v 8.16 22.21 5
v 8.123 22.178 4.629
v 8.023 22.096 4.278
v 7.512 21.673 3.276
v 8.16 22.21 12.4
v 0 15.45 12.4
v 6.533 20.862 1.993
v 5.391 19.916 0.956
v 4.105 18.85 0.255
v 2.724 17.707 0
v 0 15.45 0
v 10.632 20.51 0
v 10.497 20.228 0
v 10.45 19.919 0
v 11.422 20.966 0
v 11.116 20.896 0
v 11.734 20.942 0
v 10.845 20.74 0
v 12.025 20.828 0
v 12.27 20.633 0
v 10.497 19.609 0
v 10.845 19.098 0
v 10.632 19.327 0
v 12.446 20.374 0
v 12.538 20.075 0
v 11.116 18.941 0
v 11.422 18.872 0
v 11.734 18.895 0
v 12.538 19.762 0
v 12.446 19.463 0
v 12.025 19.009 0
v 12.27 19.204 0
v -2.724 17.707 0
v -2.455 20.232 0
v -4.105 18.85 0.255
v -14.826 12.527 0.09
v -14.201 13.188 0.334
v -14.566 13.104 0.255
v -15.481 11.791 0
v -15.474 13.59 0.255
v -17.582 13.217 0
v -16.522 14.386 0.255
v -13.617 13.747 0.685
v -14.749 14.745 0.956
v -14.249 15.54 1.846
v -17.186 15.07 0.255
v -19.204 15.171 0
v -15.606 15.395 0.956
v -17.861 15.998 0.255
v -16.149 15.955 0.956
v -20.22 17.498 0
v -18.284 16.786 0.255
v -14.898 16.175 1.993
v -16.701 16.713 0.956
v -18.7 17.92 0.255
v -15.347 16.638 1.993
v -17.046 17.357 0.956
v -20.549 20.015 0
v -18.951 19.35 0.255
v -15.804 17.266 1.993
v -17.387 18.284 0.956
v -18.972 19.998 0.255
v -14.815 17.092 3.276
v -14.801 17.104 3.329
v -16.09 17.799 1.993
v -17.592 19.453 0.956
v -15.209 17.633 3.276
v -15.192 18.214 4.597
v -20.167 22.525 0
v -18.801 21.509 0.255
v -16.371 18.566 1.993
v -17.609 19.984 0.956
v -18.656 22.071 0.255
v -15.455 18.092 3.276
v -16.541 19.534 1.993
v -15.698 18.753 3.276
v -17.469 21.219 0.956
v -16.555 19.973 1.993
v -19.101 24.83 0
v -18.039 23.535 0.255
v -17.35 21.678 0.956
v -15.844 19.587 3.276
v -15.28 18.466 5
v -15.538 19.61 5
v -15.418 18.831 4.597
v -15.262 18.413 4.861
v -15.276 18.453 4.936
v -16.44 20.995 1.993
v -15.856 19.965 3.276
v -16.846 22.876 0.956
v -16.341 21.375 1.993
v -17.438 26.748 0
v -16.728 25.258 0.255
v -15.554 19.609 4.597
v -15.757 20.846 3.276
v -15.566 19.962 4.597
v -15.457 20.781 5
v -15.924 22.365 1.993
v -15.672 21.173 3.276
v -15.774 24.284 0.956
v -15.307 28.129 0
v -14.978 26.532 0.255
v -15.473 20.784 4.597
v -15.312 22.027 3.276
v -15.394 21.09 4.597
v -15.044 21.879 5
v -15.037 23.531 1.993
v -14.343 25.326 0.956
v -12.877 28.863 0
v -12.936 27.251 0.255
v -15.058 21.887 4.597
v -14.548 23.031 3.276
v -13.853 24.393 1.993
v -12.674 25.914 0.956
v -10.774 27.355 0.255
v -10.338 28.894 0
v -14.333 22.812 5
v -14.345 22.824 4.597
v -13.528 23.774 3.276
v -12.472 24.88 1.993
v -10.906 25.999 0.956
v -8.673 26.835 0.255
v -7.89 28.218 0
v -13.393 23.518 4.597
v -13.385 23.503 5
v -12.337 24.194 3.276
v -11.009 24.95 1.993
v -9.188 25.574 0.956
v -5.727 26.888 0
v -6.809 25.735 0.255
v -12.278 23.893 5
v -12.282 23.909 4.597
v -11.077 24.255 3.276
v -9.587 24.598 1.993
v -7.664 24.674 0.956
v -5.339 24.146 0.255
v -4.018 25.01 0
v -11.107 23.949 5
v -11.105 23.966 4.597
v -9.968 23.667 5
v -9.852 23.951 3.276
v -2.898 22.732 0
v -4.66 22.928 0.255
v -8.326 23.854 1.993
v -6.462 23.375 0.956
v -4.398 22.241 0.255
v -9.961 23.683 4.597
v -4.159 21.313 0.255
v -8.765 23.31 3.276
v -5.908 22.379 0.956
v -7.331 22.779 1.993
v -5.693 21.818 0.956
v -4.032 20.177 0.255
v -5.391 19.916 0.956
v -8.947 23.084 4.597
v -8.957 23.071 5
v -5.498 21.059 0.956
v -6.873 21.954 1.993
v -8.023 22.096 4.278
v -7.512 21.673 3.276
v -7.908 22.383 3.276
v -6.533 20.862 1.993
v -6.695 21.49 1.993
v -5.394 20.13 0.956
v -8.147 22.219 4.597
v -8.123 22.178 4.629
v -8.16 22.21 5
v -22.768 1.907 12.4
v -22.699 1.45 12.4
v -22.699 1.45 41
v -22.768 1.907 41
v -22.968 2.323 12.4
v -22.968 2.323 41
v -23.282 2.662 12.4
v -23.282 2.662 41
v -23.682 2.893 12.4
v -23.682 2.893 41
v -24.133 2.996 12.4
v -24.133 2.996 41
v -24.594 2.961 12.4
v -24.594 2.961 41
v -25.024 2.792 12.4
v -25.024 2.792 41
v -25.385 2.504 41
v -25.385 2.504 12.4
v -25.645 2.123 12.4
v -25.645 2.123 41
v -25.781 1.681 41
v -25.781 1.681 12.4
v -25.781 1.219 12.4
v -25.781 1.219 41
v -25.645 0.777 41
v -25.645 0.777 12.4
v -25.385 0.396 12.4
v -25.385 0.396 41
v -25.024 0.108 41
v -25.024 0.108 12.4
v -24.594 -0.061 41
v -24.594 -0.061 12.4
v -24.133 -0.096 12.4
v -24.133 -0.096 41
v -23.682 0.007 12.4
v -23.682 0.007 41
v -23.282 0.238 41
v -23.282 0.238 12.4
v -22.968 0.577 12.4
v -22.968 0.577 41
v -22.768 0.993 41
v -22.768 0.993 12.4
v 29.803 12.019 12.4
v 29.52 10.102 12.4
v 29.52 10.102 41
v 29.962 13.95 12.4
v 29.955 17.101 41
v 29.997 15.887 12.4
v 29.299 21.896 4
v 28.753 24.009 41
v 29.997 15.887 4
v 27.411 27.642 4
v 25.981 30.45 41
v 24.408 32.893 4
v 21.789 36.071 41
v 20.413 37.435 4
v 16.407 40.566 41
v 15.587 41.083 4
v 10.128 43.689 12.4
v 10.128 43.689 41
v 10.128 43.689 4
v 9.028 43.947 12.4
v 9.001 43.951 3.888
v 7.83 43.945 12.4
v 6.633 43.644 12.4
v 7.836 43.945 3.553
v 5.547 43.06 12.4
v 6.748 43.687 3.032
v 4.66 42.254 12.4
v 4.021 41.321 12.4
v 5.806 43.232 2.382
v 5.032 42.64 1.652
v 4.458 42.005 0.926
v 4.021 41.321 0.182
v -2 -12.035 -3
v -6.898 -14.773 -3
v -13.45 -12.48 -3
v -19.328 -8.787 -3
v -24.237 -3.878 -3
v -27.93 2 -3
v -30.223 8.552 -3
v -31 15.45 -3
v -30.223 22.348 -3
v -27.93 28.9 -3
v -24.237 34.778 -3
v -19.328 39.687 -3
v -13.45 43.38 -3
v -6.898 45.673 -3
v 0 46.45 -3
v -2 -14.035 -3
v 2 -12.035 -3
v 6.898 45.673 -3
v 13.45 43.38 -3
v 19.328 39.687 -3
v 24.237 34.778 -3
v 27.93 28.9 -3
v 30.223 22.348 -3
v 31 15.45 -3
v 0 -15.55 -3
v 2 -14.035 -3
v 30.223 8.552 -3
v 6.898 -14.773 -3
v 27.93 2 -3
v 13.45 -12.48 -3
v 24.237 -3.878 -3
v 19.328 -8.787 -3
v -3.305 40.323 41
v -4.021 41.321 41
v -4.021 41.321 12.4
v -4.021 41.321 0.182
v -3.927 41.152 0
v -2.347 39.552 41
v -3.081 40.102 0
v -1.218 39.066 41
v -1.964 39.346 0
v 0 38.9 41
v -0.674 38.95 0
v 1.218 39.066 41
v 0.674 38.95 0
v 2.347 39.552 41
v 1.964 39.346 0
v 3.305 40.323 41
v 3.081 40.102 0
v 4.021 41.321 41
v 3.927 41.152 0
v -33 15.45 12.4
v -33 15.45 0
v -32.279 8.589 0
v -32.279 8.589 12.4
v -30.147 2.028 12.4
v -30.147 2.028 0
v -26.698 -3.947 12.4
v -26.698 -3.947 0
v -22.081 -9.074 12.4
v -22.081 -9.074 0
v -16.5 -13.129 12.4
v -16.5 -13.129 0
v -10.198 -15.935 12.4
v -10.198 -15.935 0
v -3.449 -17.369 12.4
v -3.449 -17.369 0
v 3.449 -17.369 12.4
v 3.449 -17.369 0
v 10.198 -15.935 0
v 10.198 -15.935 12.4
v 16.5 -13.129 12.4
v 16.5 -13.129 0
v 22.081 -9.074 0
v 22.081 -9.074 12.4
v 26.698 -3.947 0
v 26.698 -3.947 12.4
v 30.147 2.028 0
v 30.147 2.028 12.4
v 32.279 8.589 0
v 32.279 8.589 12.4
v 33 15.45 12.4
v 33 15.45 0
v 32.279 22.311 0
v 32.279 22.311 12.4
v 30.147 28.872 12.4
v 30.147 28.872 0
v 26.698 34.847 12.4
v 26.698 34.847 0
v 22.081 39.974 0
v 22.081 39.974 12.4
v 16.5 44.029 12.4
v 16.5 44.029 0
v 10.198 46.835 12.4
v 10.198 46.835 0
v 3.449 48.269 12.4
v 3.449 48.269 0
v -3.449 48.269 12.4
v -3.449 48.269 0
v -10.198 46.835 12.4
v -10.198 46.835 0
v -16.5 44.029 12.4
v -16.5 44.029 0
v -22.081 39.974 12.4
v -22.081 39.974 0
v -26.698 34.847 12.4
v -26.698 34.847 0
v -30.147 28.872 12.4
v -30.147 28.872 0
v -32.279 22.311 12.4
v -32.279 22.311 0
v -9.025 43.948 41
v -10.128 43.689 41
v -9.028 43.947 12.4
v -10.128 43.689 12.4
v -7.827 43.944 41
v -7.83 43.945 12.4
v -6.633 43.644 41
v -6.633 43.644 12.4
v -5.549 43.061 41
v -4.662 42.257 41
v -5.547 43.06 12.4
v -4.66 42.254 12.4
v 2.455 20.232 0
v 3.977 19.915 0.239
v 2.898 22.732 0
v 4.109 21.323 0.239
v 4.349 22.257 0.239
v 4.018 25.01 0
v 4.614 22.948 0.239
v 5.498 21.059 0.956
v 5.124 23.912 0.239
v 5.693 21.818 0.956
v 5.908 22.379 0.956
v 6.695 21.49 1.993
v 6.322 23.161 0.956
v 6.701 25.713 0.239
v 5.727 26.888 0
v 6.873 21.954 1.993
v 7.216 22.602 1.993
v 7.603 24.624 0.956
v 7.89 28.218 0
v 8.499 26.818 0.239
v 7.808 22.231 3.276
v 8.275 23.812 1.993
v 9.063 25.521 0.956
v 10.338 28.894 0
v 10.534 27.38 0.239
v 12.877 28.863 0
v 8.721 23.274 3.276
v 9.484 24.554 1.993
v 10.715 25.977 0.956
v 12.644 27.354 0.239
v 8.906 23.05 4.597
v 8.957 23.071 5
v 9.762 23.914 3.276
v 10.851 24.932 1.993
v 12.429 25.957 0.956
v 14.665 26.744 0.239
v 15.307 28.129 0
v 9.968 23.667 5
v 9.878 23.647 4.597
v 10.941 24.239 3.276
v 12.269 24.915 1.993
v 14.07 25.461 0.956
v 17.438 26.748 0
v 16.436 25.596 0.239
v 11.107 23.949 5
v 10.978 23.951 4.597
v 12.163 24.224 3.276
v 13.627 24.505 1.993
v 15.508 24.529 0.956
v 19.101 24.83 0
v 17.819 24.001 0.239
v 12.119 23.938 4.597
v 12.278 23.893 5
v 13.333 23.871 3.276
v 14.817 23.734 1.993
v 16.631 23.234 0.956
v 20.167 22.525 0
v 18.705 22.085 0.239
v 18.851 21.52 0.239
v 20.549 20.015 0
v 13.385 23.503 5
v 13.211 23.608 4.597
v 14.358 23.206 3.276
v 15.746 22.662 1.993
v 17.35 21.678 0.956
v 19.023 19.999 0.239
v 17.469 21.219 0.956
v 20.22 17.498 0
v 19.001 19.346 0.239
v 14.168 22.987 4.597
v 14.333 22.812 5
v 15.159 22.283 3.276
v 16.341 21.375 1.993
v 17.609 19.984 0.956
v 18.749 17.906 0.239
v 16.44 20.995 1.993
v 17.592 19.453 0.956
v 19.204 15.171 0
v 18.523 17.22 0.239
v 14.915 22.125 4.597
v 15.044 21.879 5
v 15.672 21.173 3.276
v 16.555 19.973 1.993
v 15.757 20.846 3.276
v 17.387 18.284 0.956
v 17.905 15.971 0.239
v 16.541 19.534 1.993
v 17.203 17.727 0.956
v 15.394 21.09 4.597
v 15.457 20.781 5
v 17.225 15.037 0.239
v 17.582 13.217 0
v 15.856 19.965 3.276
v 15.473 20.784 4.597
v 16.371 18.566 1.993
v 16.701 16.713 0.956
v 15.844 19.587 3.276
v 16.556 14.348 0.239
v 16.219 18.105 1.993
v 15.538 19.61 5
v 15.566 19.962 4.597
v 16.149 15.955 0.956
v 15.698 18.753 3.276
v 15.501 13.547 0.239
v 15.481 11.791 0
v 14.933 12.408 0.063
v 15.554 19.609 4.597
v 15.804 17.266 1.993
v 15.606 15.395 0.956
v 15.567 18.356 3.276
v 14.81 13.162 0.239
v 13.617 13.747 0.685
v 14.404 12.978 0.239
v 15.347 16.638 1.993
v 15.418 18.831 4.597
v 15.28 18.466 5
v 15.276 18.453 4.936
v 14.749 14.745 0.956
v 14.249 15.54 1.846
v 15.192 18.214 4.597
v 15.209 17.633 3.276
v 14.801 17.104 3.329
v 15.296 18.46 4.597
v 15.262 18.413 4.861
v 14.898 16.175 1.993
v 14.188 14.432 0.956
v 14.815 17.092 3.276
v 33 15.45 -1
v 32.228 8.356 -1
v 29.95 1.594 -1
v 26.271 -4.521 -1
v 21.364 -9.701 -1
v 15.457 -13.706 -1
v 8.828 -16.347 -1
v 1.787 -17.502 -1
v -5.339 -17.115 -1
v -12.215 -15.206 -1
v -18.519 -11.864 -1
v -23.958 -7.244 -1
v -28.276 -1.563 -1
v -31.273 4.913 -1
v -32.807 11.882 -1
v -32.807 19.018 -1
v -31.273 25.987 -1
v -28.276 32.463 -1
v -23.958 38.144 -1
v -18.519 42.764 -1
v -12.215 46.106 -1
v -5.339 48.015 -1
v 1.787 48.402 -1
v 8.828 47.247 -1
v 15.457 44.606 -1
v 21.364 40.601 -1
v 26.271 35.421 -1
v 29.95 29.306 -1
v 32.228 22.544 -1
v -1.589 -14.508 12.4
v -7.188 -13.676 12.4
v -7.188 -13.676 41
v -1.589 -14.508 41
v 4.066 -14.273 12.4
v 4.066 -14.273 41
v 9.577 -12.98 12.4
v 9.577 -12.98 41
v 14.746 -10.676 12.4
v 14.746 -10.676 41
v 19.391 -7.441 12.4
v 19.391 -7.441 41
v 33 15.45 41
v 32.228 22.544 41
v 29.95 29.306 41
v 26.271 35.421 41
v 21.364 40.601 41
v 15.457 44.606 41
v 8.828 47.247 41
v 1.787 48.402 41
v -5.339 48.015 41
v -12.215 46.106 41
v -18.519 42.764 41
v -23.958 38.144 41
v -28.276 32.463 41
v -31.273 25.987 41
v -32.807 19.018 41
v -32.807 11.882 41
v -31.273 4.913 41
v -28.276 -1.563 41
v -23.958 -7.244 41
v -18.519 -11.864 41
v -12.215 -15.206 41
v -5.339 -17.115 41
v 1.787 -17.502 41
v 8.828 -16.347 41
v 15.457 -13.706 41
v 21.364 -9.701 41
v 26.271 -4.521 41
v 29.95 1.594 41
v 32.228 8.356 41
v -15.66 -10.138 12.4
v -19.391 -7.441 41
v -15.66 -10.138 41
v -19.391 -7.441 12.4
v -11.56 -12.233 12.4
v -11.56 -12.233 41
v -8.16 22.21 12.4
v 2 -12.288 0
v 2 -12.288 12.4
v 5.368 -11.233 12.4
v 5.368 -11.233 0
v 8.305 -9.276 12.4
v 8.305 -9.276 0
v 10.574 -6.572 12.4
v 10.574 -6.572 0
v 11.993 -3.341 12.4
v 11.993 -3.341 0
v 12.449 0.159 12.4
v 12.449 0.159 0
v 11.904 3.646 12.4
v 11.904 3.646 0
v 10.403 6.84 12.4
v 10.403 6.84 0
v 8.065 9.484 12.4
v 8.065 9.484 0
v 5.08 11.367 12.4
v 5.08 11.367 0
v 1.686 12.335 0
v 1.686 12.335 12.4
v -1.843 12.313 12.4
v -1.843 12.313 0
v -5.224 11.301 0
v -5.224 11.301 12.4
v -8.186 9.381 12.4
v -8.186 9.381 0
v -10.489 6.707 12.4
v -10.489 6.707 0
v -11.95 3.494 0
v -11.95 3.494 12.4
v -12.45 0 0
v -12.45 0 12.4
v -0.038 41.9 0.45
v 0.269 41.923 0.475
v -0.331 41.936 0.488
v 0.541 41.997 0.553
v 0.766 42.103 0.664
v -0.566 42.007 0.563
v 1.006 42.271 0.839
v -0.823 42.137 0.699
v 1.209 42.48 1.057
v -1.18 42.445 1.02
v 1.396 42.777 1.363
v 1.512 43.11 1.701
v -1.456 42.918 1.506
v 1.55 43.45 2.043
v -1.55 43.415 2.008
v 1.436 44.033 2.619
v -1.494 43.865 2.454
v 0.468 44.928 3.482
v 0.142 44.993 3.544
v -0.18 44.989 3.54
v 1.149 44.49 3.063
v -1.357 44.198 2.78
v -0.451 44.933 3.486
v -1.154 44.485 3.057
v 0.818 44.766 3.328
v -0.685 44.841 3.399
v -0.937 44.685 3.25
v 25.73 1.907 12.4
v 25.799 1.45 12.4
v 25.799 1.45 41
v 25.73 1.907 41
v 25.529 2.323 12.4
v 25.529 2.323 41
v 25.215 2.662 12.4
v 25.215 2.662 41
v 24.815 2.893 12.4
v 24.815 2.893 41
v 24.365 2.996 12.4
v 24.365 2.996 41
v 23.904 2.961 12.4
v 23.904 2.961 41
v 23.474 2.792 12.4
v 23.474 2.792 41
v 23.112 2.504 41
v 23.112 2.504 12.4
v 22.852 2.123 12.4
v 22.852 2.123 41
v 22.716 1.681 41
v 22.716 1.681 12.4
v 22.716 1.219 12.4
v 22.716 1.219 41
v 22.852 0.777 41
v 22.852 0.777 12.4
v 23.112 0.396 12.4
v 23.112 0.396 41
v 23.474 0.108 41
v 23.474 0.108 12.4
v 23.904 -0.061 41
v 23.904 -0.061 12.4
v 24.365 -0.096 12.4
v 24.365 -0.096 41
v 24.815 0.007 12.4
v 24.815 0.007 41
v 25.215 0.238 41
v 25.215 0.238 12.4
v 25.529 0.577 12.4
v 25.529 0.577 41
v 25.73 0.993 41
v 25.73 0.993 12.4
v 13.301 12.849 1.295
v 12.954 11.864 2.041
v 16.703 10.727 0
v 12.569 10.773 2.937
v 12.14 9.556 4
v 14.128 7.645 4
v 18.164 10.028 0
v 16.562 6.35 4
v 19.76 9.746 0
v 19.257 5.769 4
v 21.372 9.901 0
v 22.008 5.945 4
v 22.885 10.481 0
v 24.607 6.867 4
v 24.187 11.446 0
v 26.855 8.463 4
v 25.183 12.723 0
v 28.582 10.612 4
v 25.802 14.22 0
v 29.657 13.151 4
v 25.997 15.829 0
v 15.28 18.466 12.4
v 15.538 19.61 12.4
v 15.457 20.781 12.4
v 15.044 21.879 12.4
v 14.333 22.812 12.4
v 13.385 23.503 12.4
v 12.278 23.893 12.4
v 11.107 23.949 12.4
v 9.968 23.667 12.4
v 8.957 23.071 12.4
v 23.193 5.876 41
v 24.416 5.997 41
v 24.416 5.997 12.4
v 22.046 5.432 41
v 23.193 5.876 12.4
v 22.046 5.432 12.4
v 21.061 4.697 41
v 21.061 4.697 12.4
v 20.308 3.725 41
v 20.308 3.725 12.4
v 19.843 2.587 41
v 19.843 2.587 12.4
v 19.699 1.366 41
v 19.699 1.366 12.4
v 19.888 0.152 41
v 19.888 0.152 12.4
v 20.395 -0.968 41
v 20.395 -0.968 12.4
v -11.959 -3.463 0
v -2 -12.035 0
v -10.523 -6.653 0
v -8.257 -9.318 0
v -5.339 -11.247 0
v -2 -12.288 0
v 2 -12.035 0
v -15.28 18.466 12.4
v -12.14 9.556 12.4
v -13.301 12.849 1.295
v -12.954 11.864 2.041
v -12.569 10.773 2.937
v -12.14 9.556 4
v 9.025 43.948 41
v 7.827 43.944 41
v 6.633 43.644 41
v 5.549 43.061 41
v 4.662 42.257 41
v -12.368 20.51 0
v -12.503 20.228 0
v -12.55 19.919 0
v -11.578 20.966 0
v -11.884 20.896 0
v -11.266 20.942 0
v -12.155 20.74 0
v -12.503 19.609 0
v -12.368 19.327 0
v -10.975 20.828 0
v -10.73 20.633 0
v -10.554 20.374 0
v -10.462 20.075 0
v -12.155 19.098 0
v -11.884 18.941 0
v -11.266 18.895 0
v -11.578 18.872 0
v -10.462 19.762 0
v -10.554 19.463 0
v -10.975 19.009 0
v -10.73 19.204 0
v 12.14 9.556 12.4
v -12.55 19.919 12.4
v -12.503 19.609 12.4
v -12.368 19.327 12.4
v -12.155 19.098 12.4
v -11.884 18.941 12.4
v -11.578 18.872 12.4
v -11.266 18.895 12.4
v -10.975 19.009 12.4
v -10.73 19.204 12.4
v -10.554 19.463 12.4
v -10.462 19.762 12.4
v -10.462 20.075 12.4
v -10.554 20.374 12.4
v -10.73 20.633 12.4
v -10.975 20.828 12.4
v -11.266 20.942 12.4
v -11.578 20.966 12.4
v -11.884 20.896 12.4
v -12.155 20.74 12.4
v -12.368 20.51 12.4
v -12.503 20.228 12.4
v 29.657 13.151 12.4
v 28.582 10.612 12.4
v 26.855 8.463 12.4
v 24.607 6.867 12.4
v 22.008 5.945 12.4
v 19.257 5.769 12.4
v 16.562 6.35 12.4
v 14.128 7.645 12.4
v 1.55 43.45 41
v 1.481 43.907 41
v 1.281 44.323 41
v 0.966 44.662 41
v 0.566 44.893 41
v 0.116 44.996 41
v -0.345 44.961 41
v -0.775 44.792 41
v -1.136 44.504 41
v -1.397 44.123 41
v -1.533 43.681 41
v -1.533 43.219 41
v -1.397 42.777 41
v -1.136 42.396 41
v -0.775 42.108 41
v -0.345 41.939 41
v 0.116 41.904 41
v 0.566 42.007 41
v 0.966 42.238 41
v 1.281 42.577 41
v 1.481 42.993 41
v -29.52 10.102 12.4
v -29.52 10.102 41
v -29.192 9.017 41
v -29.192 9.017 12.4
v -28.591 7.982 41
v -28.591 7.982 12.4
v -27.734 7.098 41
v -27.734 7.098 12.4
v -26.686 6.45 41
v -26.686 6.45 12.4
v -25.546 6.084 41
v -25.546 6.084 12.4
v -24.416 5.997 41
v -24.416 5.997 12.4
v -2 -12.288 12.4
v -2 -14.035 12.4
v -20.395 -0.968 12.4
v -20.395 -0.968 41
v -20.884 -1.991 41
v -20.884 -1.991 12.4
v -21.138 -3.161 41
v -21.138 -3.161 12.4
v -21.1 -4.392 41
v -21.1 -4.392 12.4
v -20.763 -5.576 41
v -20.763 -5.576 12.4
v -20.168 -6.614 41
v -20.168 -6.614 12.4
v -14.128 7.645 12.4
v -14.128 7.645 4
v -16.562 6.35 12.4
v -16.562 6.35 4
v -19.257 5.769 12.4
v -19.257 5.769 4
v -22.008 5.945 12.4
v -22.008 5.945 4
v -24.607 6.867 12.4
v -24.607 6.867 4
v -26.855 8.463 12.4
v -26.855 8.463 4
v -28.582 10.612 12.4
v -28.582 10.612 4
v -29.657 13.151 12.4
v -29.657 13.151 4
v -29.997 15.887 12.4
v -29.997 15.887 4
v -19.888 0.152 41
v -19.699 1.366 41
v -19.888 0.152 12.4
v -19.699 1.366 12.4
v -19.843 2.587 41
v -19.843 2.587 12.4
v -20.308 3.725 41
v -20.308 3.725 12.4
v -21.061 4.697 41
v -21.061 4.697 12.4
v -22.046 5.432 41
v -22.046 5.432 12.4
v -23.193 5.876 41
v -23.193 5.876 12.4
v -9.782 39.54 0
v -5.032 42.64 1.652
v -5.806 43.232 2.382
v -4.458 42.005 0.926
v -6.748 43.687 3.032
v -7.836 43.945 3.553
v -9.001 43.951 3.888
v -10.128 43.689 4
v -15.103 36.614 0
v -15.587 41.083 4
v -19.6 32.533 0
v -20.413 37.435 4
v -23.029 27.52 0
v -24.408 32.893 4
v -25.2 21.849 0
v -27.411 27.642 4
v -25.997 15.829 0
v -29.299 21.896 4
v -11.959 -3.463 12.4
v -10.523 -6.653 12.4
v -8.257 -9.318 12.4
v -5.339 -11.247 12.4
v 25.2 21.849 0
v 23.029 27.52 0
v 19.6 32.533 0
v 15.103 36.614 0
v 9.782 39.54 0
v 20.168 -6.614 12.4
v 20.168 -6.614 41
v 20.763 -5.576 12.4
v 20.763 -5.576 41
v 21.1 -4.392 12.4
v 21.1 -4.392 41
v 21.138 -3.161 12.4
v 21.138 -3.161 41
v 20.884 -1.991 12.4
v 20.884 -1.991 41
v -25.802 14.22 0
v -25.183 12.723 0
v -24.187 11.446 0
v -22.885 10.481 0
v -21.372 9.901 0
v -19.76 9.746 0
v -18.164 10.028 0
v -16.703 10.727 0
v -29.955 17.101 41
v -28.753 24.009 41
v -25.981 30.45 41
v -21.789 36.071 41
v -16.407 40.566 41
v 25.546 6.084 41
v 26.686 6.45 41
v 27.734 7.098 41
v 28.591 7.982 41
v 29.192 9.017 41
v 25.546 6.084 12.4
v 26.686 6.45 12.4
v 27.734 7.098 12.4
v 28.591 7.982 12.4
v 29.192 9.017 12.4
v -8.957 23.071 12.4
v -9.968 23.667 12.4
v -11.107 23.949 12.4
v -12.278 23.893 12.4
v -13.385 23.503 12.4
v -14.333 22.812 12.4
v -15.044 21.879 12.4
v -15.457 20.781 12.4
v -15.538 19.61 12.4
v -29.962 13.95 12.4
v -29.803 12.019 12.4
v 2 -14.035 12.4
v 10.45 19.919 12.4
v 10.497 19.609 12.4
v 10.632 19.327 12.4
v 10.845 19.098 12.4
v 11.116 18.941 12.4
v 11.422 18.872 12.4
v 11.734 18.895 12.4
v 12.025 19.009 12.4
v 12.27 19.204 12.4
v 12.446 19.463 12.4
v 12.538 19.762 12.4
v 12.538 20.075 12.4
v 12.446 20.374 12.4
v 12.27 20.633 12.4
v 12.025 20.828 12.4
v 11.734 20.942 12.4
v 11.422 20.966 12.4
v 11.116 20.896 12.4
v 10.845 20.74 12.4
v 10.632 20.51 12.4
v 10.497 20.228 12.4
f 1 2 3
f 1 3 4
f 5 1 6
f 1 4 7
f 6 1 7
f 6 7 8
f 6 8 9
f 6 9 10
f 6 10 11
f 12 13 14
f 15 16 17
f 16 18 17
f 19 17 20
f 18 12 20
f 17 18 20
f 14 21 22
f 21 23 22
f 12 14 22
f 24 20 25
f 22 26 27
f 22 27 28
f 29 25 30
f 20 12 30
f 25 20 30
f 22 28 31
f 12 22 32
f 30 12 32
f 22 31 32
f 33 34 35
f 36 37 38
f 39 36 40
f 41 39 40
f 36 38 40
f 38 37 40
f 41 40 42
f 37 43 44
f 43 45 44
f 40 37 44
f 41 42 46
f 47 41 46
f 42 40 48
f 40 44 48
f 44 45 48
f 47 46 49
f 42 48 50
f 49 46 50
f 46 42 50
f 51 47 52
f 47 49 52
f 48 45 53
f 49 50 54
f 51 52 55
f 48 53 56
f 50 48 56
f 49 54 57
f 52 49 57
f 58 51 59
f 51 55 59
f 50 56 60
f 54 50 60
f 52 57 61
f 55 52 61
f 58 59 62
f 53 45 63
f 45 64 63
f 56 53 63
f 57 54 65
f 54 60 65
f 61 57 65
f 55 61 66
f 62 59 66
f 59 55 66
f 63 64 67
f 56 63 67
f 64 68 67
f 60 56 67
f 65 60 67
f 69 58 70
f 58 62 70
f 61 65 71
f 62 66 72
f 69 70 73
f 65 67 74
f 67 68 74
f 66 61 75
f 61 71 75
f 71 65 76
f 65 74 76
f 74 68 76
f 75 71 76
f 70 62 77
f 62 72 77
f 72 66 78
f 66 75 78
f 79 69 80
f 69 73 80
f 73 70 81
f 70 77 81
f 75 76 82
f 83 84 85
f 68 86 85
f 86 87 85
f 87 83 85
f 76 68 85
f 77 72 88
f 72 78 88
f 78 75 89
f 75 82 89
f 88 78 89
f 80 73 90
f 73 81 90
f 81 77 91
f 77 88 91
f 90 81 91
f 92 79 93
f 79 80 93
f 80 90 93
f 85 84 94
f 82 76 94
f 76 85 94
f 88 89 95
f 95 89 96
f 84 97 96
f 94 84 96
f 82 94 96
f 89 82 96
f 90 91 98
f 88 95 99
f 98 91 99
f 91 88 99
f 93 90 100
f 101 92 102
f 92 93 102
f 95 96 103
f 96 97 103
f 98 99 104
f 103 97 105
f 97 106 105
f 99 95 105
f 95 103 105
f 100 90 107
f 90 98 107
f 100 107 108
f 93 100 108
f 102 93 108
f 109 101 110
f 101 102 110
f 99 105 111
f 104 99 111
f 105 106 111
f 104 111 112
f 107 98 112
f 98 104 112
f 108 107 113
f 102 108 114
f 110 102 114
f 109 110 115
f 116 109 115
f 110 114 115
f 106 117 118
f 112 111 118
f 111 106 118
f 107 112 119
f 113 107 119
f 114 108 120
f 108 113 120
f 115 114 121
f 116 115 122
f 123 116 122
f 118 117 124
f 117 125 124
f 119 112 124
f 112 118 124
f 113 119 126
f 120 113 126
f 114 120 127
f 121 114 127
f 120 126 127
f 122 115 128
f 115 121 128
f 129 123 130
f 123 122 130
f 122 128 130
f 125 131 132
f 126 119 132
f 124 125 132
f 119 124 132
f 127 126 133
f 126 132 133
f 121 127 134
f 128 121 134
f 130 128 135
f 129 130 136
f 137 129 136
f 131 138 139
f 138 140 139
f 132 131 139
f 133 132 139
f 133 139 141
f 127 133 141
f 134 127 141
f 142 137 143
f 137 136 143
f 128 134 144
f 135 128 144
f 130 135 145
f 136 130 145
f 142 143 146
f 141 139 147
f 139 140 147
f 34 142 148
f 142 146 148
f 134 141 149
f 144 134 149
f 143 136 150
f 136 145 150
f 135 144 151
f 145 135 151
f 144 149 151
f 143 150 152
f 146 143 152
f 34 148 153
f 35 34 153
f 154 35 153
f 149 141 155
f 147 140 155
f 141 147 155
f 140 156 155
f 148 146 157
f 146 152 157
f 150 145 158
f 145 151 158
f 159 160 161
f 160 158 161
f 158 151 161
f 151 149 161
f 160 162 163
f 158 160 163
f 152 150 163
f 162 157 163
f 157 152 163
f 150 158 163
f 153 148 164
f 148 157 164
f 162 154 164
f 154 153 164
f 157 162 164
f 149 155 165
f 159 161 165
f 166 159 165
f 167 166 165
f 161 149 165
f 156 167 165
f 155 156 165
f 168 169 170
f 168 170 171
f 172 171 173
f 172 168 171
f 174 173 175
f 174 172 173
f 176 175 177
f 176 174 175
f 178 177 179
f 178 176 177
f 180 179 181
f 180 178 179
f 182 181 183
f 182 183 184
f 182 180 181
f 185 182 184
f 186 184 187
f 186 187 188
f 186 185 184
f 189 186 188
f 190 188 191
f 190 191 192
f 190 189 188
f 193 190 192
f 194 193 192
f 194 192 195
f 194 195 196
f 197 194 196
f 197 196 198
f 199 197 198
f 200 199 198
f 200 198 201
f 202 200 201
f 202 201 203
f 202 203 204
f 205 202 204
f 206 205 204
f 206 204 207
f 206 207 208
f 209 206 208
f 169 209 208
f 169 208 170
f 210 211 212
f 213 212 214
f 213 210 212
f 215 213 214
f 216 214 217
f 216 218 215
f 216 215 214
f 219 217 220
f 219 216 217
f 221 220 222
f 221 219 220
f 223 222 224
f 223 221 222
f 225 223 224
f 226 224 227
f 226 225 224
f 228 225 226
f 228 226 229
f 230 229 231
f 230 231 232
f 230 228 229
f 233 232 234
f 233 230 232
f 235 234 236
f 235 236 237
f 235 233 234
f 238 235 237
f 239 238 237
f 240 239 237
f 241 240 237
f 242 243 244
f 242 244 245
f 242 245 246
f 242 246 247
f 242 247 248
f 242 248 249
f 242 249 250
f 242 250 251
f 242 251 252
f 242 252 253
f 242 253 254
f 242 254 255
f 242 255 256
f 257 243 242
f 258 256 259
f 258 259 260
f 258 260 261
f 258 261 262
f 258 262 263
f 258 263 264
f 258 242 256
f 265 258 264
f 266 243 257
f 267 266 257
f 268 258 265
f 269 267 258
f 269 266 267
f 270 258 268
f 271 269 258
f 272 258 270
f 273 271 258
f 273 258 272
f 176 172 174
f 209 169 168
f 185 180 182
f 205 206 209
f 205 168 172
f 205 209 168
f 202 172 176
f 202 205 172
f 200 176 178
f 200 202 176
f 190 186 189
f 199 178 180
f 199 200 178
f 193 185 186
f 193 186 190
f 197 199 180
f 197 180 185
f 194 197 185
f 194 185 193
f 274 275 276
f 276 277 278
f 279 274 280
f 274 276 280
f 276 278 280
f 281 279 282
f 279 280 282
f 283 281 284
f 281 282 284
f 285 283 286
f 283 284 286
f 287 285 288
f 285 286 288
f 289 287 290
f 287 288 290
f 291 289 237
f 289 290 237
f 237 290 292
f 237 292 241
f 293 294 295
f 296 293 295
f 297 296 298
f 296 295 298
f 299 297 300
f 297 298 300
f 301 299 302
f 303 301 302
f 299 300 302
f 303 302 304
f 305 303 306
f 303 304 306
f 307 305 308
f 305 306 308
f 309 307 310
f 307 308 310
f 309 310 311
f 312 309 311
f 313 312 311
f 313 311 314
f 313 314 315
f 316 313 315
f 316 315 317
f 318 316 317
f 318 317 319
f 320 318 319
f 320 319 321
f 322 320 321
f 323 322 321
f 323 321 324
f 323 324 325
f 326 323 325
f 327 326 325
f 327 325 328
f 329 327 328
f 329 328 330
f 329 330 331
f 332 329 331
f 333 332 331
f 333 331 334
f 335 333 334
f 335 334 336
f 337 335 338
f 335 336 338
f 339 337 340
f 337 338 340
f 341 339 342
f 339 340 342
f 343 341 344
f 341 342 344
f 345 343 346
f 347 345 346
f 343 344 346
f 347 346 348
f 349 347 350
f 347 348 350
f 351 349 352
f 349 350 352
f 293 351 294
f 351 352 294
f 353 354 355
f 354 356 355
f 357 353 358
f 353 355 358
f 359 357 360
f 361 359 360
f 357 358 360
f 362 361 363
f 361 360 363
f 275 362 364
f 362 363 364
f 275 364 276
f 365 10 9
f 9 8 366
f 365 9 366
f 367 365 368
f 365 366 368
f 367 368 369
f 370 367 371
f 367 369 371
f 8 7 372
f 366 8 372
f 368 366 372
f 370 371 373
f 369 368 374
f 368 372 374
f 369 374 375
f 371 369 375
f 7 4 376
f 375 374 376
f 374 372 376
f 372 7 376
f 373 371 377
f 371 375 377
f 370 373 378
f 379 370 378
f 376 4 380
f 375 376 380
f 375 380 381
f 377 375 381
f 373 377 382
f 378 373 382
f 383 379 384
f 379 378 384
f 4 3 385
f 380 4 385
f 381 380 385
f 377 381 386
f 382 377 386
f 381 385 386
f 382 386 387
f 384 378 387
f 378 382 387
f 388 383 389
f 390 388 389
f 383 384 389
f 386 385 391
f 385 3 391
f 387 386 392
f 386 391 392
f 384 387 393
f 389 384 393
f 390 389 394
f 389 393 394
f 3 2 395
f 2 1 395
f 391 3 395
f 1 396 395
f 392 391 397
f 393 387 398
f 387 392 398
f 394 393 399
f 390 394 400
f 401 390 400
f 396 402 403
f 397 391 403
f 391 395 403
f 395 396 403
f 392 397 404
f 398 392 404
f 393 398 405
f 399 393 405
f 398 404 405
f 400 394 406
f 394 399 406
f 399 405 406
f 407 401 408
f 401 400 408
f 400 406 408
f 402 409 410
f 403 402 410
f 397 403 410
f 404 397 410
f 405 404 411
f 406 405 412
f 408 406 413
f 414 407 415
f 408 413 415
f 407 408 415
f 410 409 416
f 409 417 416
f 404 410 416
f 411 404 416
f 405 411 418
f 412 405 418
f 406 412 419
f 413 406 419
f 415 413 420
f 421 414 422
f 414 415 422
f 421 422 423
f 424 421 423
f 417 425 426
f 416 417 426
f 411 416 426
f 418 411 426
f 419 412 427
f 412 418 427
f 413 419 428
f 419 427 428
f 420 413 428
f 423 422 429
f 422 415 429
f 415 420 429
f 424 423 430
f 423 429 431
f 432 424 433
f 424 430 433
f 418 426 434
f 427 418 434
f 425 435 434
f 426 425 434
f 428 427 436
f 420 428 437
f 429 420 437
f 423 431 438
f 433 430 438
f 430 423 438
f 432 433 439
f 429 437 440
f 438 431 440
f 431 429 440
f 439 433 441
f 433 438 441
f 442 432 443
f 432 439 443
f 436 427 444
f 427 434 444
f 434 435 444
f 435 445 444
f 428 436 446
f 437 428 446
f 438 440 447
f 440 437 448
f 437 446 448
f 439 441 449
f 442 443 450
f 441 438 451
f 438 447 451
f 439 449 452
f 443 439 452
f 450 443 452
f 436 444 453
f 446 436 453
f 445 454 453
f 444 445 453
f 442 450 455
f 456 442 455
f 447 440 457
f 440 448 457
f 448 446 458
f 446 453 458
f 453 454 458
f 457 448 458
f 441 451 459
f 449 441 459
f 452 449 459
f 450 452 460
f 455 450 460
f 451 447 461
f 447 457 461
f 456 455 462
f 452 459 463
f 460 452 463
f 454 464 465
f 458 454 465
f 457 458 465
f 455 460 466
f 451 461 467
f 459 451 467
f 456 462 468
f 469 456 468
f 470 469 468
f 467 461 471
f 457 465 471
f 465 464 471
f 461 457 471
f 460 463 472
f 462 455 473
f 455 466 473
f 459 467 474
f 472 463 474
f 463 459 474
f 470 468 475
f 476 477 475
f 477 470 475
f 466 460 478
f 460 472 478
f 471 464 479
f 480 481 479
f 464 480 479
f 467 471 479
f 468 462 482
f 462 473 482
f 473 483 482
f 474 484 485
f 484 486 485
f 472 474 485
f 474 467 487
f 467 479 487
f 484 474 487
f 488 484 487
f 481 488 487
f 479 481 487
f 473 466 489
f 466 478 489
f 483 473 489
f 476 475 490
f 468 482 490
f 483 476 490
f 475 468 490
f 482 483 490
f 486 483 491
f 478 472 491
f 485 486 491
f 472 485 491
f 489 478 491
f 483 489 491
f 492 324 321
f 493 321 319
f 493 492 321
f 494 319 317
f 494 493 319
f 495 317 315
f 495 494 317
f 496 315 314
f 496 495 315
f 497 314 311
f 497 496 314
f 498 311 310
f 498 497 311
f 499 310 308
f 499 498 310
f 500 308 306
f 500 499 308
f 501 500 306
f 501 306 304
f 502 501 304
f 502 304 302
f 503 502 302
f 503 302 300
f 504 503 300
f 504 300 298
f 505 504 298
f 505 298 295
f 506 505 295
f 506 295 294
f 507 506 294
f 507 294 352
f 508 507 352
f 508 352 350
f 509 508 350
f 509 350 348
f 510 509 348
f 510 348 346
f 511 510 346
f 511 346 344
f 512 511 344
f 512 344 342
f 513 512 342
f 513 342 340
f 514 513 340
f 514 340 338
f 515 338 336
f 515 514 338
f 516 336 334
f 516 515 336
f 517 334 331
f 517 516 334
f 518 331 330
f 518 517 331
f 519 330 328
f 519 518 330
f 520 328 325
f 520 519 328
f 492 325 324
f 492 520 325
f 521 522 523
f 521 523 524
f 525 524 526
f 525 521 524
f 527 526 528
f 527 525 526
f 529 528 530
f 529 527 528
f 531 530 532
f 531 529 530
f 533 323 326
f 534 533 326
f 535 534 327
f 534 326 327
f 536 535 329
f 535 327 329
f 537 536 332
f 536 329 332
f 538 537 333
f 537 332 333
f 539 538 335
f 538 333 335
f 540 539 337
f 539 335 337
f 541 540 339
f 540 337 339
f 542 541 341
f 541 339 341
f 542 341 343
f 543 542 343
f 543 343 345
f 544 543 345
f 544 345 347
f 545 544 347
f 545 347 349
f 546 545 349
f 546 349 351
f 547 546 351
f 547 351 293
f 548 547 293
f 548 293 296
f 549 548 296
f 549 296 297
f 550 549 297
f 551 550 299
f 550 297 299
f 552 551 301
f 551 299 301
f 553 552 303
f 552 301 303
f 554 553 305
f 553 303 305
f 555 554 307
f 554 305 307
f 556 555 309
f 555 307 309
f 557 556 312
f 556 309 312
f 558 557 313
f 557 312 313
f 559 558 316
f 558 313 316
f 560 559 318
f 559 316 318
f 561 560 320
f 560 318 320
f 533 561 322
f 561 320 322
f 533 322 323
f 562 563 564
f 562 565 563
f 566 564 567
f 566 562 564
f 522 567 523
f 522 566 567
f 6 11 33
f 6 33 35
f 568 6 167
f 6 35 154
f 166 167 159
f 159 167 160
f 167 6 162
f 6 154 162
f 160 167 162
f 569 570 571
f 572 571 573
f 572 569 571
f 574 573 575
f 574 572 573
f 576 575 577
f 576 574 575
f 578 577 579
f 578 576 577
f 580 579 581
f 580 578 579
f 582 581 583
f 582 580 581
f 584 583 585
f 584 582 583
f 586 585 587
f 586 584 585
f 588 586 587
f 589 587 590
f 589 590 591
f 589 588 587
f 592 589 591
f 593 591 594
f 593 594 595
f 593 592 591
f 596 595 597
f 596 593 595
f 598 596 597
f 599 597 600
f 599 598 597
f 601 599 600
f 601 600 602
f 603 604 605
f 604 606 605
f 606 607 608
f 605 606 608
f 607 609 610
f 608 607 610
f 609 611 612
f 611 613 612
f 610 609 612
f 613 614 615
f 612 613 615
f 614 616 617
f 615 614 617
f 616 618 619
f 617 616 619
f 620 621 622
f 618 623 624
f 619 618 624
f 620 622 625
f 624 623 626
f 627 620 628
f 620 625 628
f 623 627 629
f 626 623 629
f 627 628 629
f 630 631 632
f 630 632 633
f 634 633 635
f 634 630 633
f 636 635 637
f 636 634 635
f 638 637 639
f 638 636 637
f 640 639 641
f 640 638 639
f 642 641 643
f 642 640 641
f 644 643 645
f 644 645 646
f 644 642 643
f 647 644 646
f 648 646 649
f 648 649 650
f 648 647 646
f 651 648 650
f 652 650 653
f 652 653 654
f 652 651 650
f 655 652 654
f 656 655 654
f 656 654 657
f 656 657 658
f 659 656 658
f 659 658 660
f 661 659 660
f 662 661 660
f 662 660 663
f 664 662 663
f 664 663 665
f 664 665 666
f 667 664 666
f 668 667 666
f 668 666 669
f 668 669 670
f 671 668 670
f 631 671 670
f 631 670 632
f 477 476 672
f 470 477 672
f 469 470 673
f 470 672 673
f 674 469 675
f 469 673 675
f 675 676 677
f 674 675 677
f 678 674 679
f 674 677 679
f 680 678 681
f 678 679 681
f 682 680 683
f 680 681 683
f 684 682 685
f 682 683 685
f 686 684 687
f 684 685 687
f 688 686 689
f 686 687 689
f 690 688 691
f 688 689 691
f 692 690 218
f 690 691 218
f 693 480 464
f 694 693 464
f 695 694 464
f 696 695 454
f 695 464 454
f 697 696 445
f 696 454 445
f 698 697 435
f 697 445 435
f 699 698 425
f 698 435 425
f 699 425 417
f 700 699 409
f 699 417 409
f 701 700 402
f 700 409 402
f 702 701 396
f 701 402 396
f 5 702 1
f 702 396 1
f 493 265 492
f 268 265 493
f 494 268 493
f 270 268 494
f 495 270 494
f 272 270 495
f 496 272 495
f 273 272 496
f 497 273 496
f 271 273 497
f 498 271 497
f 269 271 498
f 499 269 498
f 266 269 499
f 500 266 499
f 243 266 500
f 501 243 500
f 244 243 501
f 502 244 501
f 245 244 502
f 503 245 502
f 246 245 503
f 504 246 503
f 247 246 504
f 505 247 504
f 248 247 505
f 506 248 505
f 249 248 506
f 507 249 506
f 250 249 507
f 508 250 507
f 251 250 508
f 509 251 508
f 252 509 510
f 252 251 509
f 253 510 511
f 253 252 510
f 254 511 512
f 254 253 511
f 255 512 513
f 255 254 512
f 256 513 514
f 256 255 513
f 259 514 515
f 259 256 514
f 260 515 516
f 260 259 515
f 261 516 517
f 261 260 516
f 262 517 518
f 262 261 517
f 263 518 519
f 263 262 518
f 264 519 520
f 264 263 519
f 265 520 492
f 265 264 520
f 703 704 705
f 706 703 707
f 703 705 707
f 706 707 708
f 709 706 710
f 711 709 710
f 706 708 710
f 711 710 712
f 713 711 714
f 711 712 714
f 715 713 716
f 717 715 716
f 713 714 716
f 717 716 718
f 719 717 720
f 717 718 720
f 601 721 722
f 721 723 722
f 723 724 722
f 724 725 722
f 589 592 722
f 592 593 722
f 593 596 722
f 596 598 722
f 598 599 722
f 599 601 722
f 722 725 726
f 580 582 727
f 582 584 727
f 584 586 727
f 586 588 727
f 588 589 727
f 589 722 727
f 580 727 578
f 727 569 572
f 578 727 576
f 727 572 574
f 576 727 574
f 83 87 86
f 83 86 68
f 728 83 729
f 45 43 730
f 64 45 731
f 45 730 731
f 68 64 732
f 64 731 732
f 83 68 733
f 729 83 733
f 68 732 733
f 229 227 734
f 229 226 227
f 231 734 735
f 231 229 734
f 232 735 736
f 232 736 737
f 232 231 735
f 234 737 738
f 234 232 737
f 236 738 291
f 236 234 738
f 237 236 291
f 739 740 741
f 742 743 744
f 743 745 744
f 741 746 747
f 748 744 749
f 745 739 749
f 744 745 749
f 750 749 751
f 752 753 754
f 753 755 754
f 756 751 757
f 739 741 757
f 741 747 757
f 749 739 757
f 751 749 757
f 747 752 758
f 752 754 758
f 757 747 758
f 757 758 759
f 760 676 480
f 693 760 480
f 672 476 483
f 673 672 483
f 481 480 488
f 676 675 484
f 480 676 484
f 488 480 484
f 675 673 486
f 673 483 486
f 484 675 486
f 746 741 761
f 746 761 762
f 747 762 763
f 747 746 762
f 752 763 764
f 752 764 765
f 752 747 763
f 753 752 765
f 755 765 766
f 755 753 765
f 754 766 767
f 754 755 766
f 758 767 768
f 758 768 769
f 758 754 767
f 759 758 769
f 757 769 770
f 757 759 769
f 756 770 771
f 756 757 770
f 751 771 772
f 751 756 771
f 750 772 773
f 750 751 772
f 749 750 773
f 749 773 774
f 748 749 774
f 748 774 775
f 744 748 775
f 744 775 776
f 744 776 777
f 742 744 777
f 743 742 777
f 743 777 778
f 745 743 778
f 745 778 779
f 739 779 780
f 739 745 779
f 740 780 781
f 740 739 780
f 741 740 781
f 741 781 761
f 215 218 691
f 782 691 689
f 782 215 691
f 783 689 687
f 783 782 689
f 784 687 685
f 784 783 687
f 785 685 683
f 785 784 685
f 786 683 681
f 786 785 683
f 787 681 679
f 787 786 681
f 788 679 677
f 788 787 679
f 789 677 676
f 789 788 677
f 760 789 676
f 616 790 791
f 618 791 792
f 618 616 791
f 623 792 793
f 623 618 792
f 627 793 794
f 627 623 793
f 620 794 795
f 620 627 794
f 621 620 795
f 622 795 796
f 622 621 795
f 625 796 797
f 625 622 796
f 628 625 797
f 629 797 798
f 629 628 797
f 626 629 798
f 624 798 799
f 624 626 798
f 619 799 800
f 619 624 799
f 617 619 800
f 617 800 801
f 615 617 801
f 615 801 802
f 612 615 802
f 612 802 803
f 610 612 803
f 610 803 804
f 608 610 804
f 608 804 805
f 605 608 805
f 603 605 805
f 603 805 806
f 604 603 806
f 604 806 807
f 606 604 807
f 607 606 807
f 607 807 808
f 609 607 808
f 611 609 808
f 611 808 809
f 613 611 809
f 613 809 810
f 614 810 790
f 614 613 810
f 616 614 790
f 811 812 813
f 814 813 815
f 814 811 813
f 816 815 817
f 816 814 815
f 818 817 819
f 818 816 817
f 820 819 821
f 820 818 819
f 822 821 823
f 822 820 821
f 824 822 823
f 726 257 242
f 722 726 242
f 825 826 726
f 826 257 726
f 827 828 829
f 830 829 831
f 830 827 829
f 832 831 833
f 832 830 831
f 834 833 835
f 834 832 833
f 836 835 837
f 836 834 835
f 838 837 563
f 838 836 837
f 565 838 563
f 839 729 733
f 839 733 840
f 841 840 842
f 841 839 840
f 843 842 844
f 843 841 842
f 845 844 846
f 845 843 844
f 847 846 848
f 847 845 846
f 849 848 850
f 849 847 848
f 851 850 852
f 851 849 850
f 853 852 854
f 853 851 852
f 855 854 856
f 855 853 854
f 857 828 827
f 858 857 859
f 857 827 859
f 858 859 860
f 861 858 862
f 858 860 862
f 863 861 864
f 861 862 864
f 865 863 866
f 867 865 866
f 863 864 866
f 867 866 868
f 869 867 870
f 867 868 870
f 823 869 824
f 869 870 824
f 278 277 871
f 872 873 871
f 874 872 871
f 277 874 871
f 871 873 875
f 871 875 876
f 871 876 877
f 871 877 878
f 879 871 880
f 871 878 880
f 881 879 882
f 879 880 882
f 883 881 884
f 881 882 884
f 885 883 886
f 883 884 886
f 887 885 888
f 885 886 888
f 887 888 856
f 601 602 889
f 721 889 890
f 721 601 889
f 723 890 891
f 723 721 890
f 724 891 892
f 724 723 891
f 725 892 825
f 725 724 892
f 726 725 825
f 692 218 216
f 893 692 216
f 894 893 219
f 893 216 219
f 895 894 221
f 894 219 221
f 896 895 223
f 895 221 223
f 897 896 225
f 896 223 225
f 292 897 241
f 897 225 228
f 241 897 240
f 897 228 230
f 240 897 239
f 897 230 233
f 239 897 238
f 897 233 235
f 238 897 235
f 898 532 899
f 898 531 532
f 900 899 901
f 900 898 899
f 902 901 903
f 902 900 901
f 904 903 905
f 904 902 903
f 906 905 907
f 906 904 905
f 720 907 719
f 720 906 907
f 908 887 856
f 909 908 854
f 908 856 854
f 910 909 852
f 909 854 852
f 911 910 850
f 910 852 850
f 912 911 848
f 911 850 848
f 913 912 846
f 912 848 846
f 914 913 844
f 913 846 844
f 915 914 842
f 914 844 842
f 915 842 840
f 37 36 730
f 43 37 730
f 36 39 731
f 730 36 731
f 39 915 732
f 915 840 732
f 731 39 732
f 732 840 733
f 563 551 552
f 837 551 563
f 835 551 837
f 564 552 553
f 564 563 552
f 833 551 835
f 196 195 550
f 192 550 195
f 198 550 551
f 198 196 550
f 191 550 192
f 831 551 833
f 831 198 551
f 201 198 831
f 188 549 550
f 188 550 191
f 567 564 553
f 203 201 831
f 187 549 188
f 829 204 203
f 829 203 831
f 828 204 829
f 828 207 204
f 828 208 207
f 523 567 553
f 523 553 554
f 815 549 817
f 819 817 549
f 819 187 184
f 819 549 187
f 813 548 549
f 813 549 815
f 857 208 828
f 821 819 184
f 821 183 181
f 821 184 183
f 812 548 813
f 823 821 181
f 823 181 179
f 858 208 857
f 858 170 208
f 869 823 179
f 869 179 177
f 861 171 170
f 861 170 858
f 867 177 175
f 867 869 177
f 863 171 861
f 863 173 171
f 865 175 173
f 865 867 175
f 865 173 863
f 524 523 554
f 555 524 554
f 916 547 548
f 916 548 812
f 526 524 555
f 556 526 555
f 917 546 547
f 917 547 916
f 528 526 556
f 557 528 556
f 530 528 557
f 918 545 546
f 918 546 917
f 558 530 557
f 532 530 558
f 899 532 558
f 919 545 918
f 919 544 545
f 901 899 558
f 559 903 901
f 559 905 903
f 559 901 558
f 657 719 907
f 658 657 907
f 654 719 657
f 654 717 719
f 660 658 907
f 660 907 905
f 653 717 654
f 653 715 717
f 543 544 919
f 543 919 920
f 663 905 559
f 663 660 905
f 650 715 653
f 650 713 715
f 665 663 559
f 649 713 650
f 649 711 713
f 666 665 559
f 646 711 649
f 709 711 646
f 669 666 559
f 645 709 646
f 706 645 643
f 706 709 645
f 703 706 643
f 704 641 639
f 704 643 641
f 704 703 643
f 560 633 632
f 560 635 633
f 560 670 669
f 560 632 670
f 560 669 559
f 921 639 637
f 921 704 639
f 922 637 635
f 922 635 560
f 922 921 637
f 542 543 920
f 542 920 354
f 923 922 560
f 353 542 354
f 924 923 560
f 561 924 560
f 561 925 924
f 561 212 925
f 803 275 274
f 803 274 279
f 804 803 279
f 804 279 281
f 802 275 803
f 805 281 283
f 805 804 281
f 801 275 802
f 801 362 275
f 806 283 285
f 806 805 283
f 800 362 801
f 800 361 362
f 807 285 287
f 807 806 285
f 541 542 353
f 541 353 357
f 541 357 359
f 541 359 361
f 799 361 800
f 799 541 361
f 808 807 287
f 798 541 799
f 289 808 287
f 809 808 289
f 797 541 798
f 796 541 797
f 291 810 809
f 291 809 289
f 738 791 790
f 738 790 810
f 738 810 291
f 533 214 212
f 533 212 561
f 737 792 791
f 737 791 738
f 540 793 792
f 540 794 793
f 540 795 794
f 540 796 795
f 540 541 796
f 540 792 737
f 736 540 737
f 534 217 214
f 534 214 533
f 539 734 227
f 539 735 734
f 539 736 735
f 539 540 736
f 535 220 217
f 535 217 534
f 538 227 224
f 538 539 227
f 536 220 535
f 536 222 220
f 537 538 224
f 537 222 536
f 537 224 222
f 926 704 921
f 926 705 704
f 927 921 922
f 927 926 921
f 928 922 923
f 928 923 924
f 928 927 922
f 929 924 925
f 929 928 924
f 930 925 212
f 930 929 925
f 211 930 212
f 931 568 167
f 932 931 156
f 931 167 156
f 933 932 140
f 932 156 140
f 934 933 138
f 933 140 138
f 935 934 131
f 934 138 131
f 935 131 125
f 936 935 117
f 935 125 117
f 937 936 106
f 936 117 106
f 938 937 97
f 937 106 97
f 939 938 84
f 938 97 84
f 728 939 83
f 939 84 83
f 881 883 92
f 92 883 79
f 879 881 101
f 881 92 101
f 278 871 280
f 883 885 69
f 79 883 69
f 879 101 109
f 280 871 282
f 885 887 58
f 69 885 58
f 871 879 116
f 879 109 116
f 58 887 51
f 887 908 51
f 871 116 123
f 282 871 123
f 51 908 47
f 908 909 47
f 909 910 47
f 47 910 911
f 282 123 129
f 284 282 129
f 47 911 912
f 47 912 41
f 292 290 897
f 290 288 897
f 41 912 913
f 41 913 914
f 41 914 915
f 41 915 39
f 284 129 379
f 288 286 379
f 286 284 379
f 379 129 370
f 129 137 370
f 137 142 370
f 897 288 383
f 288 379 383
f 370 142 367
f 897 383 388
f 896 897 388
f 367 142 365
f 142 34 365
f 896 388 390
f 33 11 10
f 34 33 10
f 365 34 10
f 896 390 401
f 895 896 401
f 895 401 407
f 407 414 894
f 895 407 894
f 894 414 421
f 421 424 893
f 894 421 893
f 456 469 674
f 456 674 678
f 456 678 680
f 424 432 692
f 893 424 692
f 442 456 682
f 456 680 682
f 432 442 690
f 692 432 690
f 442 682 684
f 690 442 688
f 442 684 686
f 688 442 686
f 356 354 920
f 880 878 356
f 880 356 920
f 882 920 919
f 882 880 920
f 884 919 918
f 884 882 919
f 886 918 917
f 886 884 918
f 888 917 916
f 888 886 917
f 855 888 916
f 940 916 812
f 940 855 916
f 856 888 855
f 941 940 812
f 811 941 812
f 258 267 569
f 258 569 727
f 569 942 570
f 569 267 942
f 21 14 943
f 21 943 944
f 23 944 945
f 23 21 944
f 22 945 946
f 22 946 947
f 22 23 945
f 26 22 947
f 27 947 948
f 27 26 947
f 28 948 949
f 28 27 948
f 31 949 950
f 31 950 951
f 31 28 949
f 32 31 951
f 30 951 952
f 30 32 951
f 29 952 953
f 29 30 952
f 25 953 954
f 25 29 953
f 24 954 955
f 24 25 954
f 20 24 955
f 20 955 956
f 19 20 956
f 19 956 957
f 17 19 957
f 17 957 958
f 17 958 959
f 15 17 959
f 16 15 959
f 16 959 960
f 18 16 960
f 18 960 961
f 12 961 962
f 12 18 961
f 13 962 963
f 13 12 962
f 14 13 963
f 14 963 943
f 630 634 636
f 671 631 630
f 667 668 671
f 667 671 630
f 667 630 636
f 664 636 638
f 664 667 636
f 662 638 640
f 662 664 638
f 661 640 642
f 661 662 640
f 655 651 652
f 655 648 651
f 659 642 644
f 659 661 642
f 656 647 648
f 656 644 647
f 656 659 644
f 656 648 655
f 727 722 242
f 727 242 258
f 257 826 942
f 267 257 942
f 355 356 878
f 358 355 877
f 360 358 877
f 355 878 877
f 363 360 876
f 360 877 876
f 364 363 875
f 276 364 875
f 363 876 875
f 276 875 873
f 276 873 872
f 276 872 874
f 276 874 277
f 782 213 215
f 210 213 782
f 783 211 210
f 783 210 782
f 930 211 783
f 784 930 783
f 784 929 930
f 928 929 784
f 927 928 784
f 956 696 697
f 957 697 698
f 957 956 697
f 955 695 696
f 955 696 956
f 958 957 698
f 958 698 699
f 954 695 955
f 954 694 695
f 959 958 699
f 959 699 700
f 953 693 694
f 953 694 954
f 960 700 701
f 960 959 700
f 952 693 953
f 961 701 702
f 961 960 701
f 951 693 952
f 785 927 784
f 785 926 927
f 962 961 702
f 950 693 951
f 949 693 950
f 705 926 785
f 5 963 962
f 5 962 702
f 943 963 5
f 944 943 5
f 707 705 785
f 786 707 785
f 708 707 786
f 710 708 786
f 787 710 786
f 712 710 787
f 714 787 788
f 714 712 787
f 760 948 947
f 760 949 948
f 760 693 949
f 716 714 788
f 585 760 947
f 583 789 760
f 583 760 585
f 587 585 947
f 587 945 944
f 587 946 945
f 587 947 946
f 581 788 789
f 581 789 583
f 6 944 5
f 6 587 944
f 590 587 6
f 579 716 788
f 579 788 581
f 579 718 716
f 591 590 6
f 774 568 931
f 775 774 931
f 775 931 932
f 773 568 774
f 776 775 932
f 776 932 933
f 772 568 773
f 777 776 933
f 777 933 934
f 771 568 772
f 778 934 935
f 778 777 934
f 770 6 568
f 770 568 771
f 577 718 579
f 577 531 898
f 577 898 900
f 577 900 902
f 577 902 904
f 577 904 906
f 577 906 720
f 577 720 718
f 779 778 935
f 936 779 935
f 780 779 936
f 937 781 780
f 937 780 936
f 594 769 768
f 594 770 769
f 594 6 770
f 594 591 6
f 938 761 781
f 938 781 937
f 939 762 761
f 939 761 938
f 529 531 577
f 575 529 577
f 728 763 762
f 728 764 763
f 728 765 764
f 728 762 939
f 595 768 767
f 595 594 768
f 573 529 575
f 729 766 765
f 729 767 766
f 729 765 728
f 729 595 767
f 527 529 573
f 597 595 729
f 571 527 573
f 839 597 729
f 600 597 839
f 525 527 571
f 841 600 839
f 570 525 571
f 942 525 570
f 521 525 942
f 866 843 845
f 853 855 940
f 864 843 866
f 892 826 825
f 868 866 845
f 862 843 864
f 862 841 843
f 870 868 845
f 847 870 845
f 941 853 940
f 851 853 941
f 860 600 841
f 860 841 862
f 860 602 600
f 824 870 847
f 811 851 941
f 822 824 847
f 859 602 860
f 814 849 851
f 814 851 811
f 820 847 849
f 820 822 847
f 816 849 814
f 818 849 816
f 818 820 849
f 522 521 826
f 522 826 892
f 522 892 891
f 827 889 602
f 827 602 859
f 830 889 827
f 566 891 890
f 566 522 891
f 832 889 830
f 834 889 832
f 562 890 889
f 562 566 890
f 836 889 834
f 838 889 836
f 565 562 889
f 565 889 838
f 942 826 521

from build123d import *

# Parameters (mm, degrees)
SKETCH1_R                = 15.45
SKETCH1_R_2              = 12.45
SKETCH1_R_3              = 33
SKETCH1_R_4              = 30
SKETCH1_R_5              = 4.05
SKETCH1_R_6              = 1.05
BOSS_EXTRUDE2_DEPTH      = 12.4
BOSS_EXTRUDE3_START      = 3
SKETCH2_R                = 33
BOSS_EXTRUDE3_DEPTH      = 3
SKETCH3_R                = 33
SKETCH3_R_2              = 30
BOSS_EXTRUDE4_DEPTH      = 28.6
FILLET1_R                = 10
BOSS_EXTRUDE5_DEPTH      = 12.4
CHAMFER1_SIZE            = 4
FILLET2_R                = 5
BOSS_EXTRUDE6_DEPTH      = 28.6
BOSS_EXTRUDE6_DEPTH_BACK = 14.4
SKETCH5_R                = 4.55
SKETCH5_R_2              = 1.55
FILLET3_R                = 5
CHAMFER2_SIZE            = 2
SKETCH6_W                = 4
SKETCH6_H                = 2
CUT_EXTRUDE1_DEPTH       = 23.4


with BuildPart() as part:
    # Sketch1 → Boss-Extrude2 (new body)
    # profile 1 of 4: a face of its own
    with BuildSketch(Plane.XY):
        Circle(SKETCH1_R)
        with Locations(Location((0, 0, 0), (0, 0, 180))):
            Circle(SKETCH1_R_2, mode=Mode.SUBTRACT)
    # profile 2 of 4: a face of its own
    with BuildSketch(Plane.XY):
        with Locations(Location((0, 15.45, 0), (0, 0, 180))):
            Circle(SKETCH1_R_3)
        with Locations((0, 15.45)):
            Circle(SKETCH1_R_4, mode=Mode.SUBTRACT)
    # profile 3 of 4: a face of its own
    with BuildSketch(Plane.XY):
        with Locations(Location((11.5, 19.918584287, 0), (0, 0, 180))):
            Circle(SKETCH1_R_5)
        with Locations(Location((11.5, 19.918584287, 0), (0, 0, 180))):
            Circle(SKETCH1_R_6, mode=Mode.SUBTRACT)
    # profile 4 of 4: a face of its own
    with BuildSketch(Plane.XY):
        with Locations(Location((-11.5, 19.918584287, 0), (0, 0, 180))):
            Circle(SKETCH1_R_5)
        with Locations(Location((-11.5, 19.918584287, 0), (0, 0, 180))):
            Circle(SKETCH1_R_6, mode=Mode.SUBTRACT)
    extrude(amount=BOSS_EXTRUDE2_DEPTH)

    # Sketch2 → Boss-Extrude3 (add)
    with BuildSketch(Plane(origin=(0, 0, 0), x_dir=(-1, 0, 0), z_dir=(0, 0, -1)).offset(BOSS_EXTRUDE3_START)):
        with Locations(Location((0, 15.45, 0), (0, 0, 180))):
            Circle(SKETCH2_R)
    extrude(amount=-BOSS_EXTRUDE3_DEPTH)

    # Sketch3 → Boss-Extrude4 (add)
    with BuildSketch(Plane.XY.offset(12.4)):
        with Locations((0, 15.45)):
            Circle(SKETCH3_R)
        with Locations(Location((0, 15.45, 0), (0, 0, 256.137567884))):
            Circle(SKETCH3_R_2, mode=Mode.SUBTRACT)
    extrude(amount=BOSS_EXTRUDE4_DEPTH)

    # Fillet1
    # the kernel refuses this fillet: 10 mm, written as the material it adds along each edge
    with BuildSketch(Plane(origin=(-7.18774525, -13.676213592, 12.4), x_dir=(-0.20848530714015037, 0.9780254990063793, 0), z_dir=(0, 0, -1))) as fillet1_piece_1:
        with BuildLine():
            CenterArc((31.441766058, -6.395526036), FILLET1_R, 140.241533635, 142.62650255)
            ThreePointArc((33.668828933, -16.144381915), (14.016585538, -13.948724396), (0, 0))
            ThreePointArc((0, 0), (11.877146347, -5.568912274), (23.754292694, 0))
        make_face()
    extrude(amount=12.4)
    with BuildSketch(Plane(origin=(7.18774525, -13.676213592, 12.4), x_dir=(0.20848530714015037, 0.9780254990063793, 0), z_dir=(0, 0, -1))) as fillet1_piece_2:
        with BuildLine():
            CenterArc((31.441766058, 6.395526036), FILLET1_R, 77.131963815, 142.62650255)
            ThreePointArc((33.668828933, 16.144381915), (14.016585538, 13.948724396), (0, 0))
            ThreePointArc((0, 0), (11.877146347, 5.568912274), (23.754292694, 0))
        make_face()
    extrude(amount=12.4)

    # Sketch4 → Boss-Extrude5 (add)
    with BuildSketch(Plane.XY):
        Polygon((-15.355968184, 18.680032971), (-12.140166258, 9.556090373), (-4.457434094, 12.838952207), (4.080215127, 12.838952207), (12.140166258, 9.556090373), (15.355968184, 18.680032971), (9.70403689, 17.830268754), (8.160430255, 22.209822799), (0, 15.45), (-8.160430255, 22.209822799), (-10.090971595, 17.830268754), align=None)
    extrude(amount=BOSS_EXTRUDE5_DEPTH)

    # Chamfer1
    chamfer1_edges = [part.edges().sort_by_distance(p)[0] for p in [
        (0, 45.45, 0),
        (-23.339432443, 6.316081984, 0),
        (23.339432443, 6.316081984, 0),
    ]]
    chamfer(chamfer1_edges, length=CHAMFER1_SIZE)

    # Fillet2
    # the kernel refuses this fillet: 5 mm, written as the material it adds along each edge
    with BuildSketch(Plane(origin=(-11.5, 19.918584287, 0), x_dir=(0.4626548968458433, -0.8865384630260337, 0), z_dir=(0.8865384630260337, 0.4626548968458433, 0))) as fillet2_piece_1:
        with BuildLine():
            CenterArc((4.05 + FILLET2_R, -FILLET2_R), FILLET2_R, 90, 90)
            Line((4.05, -FILLET2_R), (4.05, 0))
            Line((4.05, 0), (4.05 + FILLET2_R, 0))
        make_face()
    revolve(axis=Axis((-11.5, 19.918584287, 0), (0, 0, -1)), revolution_arc=359.64)
    with BuildSketch(Plane(origin=(11.5, 19.918584287, 0), x_dir=(-0.4682160132284685, -0.8836140361925214, 0), z_dir=(0.8836140361925214, -0.4682160132284685, 0))) as fillet2_piece_2:
        with BuildLine():
            CenterArc((4.05 + FILLET2_R, -FILLET2_R), FILLET2_R, 90, 90)
            Line((4.05, -FILLET2_R), (4.05, 0))
            Line((4.05, 0), (4.05 + FILLET2_R, 0))
        make_face()
    revolve(axis=Axis((11.5, 19.918584287, 0), (0, 0, -1)), revolution_arc=359.64)

    # Sketch5 → Boss-Extrude6 (add, two sides: drawn at the far end of the back side and taken through both)
    # profile 1 of 3: a face of its own
    with BuildSketch(Plane.XY.offset(12.4).offset(-BOSS_EXTRUDE6_DEPTH_BACK)):
        with Locations((0, 43.45)):
            Circle(SKETCH5_R)
        with Locations((0, 43.45)):
            Circle(SKETCH5_R_2, mode=Mode.SUBTRACT)
    # profile 2 of 3: a face of its own
    with BuildSketch(Plane.XY.offset(12.4).offset(-BOSS_EXTRUDE6_DEPTH_BACK)):
        with Locations((24.248711306, 1.45)):
            Circle(SKETCH5_R)
        with Locations((24.248711306, 1.45)):
            Circle(SKETCH5_R_2, mode=Mode.SUBTRACT)
    # profile 3 of 3: a face of its own
    with BuildSketch(Plane.XY.offset(12.4).offset(-BOSS_EXTRUDE6_DEPTH_BACK)):
        with Locations((-24.248711306, 1.45)):
            Circle(SKETCH5_R)
        with Locations((-24.248711306, 1.45)):
            Circle(SKETCH5_R_2, mode=Mode.SUBTRACT)
    extrude(amount=BOSS_EXTRUDE6_DEPTH + BOSS_EXTRUDE6_DEPTH_BACK)

    # Fillet3
    fillet3_edges = [part.edges().sort_by_distance(p)[0] for p in [
        (23.612570286, -3.055310711, 26.7),
        (27.832354323, 4.25356964, 26.7),
        (-27.832354323, 4.25356964, 26.7),
        (-23.612570286, -3.055310711, 26.7),
        (4.219784038, 45.151741071, 22.5),
        (-4.219784038, 45.151741071, 22.5),
    ]]
    fillet(fillet3_edges, radius=FILLET3_R)

    # Chamfer2
    chamfer2_edges = [part.edges().sort_by_distance(p)[0] for p in [
        (-33, 15.45, -3),
    ]]
    chamfer(chamfer2_edges, length=CHAMFER2_SIZE)

    # Sketch6 → Cut-Extrude1 (cut)
    with BuildSketch(Plane.XY.offset(12.4)):
        with Locations((0, -13.034949107)):
            Rectangle(SKETCH6_W, SKETCH6_H)
    extrude(amount=-CUT_EXTRUDE1_DEPTH, mode=Mode.SUBTRACT)


solid = part.part
